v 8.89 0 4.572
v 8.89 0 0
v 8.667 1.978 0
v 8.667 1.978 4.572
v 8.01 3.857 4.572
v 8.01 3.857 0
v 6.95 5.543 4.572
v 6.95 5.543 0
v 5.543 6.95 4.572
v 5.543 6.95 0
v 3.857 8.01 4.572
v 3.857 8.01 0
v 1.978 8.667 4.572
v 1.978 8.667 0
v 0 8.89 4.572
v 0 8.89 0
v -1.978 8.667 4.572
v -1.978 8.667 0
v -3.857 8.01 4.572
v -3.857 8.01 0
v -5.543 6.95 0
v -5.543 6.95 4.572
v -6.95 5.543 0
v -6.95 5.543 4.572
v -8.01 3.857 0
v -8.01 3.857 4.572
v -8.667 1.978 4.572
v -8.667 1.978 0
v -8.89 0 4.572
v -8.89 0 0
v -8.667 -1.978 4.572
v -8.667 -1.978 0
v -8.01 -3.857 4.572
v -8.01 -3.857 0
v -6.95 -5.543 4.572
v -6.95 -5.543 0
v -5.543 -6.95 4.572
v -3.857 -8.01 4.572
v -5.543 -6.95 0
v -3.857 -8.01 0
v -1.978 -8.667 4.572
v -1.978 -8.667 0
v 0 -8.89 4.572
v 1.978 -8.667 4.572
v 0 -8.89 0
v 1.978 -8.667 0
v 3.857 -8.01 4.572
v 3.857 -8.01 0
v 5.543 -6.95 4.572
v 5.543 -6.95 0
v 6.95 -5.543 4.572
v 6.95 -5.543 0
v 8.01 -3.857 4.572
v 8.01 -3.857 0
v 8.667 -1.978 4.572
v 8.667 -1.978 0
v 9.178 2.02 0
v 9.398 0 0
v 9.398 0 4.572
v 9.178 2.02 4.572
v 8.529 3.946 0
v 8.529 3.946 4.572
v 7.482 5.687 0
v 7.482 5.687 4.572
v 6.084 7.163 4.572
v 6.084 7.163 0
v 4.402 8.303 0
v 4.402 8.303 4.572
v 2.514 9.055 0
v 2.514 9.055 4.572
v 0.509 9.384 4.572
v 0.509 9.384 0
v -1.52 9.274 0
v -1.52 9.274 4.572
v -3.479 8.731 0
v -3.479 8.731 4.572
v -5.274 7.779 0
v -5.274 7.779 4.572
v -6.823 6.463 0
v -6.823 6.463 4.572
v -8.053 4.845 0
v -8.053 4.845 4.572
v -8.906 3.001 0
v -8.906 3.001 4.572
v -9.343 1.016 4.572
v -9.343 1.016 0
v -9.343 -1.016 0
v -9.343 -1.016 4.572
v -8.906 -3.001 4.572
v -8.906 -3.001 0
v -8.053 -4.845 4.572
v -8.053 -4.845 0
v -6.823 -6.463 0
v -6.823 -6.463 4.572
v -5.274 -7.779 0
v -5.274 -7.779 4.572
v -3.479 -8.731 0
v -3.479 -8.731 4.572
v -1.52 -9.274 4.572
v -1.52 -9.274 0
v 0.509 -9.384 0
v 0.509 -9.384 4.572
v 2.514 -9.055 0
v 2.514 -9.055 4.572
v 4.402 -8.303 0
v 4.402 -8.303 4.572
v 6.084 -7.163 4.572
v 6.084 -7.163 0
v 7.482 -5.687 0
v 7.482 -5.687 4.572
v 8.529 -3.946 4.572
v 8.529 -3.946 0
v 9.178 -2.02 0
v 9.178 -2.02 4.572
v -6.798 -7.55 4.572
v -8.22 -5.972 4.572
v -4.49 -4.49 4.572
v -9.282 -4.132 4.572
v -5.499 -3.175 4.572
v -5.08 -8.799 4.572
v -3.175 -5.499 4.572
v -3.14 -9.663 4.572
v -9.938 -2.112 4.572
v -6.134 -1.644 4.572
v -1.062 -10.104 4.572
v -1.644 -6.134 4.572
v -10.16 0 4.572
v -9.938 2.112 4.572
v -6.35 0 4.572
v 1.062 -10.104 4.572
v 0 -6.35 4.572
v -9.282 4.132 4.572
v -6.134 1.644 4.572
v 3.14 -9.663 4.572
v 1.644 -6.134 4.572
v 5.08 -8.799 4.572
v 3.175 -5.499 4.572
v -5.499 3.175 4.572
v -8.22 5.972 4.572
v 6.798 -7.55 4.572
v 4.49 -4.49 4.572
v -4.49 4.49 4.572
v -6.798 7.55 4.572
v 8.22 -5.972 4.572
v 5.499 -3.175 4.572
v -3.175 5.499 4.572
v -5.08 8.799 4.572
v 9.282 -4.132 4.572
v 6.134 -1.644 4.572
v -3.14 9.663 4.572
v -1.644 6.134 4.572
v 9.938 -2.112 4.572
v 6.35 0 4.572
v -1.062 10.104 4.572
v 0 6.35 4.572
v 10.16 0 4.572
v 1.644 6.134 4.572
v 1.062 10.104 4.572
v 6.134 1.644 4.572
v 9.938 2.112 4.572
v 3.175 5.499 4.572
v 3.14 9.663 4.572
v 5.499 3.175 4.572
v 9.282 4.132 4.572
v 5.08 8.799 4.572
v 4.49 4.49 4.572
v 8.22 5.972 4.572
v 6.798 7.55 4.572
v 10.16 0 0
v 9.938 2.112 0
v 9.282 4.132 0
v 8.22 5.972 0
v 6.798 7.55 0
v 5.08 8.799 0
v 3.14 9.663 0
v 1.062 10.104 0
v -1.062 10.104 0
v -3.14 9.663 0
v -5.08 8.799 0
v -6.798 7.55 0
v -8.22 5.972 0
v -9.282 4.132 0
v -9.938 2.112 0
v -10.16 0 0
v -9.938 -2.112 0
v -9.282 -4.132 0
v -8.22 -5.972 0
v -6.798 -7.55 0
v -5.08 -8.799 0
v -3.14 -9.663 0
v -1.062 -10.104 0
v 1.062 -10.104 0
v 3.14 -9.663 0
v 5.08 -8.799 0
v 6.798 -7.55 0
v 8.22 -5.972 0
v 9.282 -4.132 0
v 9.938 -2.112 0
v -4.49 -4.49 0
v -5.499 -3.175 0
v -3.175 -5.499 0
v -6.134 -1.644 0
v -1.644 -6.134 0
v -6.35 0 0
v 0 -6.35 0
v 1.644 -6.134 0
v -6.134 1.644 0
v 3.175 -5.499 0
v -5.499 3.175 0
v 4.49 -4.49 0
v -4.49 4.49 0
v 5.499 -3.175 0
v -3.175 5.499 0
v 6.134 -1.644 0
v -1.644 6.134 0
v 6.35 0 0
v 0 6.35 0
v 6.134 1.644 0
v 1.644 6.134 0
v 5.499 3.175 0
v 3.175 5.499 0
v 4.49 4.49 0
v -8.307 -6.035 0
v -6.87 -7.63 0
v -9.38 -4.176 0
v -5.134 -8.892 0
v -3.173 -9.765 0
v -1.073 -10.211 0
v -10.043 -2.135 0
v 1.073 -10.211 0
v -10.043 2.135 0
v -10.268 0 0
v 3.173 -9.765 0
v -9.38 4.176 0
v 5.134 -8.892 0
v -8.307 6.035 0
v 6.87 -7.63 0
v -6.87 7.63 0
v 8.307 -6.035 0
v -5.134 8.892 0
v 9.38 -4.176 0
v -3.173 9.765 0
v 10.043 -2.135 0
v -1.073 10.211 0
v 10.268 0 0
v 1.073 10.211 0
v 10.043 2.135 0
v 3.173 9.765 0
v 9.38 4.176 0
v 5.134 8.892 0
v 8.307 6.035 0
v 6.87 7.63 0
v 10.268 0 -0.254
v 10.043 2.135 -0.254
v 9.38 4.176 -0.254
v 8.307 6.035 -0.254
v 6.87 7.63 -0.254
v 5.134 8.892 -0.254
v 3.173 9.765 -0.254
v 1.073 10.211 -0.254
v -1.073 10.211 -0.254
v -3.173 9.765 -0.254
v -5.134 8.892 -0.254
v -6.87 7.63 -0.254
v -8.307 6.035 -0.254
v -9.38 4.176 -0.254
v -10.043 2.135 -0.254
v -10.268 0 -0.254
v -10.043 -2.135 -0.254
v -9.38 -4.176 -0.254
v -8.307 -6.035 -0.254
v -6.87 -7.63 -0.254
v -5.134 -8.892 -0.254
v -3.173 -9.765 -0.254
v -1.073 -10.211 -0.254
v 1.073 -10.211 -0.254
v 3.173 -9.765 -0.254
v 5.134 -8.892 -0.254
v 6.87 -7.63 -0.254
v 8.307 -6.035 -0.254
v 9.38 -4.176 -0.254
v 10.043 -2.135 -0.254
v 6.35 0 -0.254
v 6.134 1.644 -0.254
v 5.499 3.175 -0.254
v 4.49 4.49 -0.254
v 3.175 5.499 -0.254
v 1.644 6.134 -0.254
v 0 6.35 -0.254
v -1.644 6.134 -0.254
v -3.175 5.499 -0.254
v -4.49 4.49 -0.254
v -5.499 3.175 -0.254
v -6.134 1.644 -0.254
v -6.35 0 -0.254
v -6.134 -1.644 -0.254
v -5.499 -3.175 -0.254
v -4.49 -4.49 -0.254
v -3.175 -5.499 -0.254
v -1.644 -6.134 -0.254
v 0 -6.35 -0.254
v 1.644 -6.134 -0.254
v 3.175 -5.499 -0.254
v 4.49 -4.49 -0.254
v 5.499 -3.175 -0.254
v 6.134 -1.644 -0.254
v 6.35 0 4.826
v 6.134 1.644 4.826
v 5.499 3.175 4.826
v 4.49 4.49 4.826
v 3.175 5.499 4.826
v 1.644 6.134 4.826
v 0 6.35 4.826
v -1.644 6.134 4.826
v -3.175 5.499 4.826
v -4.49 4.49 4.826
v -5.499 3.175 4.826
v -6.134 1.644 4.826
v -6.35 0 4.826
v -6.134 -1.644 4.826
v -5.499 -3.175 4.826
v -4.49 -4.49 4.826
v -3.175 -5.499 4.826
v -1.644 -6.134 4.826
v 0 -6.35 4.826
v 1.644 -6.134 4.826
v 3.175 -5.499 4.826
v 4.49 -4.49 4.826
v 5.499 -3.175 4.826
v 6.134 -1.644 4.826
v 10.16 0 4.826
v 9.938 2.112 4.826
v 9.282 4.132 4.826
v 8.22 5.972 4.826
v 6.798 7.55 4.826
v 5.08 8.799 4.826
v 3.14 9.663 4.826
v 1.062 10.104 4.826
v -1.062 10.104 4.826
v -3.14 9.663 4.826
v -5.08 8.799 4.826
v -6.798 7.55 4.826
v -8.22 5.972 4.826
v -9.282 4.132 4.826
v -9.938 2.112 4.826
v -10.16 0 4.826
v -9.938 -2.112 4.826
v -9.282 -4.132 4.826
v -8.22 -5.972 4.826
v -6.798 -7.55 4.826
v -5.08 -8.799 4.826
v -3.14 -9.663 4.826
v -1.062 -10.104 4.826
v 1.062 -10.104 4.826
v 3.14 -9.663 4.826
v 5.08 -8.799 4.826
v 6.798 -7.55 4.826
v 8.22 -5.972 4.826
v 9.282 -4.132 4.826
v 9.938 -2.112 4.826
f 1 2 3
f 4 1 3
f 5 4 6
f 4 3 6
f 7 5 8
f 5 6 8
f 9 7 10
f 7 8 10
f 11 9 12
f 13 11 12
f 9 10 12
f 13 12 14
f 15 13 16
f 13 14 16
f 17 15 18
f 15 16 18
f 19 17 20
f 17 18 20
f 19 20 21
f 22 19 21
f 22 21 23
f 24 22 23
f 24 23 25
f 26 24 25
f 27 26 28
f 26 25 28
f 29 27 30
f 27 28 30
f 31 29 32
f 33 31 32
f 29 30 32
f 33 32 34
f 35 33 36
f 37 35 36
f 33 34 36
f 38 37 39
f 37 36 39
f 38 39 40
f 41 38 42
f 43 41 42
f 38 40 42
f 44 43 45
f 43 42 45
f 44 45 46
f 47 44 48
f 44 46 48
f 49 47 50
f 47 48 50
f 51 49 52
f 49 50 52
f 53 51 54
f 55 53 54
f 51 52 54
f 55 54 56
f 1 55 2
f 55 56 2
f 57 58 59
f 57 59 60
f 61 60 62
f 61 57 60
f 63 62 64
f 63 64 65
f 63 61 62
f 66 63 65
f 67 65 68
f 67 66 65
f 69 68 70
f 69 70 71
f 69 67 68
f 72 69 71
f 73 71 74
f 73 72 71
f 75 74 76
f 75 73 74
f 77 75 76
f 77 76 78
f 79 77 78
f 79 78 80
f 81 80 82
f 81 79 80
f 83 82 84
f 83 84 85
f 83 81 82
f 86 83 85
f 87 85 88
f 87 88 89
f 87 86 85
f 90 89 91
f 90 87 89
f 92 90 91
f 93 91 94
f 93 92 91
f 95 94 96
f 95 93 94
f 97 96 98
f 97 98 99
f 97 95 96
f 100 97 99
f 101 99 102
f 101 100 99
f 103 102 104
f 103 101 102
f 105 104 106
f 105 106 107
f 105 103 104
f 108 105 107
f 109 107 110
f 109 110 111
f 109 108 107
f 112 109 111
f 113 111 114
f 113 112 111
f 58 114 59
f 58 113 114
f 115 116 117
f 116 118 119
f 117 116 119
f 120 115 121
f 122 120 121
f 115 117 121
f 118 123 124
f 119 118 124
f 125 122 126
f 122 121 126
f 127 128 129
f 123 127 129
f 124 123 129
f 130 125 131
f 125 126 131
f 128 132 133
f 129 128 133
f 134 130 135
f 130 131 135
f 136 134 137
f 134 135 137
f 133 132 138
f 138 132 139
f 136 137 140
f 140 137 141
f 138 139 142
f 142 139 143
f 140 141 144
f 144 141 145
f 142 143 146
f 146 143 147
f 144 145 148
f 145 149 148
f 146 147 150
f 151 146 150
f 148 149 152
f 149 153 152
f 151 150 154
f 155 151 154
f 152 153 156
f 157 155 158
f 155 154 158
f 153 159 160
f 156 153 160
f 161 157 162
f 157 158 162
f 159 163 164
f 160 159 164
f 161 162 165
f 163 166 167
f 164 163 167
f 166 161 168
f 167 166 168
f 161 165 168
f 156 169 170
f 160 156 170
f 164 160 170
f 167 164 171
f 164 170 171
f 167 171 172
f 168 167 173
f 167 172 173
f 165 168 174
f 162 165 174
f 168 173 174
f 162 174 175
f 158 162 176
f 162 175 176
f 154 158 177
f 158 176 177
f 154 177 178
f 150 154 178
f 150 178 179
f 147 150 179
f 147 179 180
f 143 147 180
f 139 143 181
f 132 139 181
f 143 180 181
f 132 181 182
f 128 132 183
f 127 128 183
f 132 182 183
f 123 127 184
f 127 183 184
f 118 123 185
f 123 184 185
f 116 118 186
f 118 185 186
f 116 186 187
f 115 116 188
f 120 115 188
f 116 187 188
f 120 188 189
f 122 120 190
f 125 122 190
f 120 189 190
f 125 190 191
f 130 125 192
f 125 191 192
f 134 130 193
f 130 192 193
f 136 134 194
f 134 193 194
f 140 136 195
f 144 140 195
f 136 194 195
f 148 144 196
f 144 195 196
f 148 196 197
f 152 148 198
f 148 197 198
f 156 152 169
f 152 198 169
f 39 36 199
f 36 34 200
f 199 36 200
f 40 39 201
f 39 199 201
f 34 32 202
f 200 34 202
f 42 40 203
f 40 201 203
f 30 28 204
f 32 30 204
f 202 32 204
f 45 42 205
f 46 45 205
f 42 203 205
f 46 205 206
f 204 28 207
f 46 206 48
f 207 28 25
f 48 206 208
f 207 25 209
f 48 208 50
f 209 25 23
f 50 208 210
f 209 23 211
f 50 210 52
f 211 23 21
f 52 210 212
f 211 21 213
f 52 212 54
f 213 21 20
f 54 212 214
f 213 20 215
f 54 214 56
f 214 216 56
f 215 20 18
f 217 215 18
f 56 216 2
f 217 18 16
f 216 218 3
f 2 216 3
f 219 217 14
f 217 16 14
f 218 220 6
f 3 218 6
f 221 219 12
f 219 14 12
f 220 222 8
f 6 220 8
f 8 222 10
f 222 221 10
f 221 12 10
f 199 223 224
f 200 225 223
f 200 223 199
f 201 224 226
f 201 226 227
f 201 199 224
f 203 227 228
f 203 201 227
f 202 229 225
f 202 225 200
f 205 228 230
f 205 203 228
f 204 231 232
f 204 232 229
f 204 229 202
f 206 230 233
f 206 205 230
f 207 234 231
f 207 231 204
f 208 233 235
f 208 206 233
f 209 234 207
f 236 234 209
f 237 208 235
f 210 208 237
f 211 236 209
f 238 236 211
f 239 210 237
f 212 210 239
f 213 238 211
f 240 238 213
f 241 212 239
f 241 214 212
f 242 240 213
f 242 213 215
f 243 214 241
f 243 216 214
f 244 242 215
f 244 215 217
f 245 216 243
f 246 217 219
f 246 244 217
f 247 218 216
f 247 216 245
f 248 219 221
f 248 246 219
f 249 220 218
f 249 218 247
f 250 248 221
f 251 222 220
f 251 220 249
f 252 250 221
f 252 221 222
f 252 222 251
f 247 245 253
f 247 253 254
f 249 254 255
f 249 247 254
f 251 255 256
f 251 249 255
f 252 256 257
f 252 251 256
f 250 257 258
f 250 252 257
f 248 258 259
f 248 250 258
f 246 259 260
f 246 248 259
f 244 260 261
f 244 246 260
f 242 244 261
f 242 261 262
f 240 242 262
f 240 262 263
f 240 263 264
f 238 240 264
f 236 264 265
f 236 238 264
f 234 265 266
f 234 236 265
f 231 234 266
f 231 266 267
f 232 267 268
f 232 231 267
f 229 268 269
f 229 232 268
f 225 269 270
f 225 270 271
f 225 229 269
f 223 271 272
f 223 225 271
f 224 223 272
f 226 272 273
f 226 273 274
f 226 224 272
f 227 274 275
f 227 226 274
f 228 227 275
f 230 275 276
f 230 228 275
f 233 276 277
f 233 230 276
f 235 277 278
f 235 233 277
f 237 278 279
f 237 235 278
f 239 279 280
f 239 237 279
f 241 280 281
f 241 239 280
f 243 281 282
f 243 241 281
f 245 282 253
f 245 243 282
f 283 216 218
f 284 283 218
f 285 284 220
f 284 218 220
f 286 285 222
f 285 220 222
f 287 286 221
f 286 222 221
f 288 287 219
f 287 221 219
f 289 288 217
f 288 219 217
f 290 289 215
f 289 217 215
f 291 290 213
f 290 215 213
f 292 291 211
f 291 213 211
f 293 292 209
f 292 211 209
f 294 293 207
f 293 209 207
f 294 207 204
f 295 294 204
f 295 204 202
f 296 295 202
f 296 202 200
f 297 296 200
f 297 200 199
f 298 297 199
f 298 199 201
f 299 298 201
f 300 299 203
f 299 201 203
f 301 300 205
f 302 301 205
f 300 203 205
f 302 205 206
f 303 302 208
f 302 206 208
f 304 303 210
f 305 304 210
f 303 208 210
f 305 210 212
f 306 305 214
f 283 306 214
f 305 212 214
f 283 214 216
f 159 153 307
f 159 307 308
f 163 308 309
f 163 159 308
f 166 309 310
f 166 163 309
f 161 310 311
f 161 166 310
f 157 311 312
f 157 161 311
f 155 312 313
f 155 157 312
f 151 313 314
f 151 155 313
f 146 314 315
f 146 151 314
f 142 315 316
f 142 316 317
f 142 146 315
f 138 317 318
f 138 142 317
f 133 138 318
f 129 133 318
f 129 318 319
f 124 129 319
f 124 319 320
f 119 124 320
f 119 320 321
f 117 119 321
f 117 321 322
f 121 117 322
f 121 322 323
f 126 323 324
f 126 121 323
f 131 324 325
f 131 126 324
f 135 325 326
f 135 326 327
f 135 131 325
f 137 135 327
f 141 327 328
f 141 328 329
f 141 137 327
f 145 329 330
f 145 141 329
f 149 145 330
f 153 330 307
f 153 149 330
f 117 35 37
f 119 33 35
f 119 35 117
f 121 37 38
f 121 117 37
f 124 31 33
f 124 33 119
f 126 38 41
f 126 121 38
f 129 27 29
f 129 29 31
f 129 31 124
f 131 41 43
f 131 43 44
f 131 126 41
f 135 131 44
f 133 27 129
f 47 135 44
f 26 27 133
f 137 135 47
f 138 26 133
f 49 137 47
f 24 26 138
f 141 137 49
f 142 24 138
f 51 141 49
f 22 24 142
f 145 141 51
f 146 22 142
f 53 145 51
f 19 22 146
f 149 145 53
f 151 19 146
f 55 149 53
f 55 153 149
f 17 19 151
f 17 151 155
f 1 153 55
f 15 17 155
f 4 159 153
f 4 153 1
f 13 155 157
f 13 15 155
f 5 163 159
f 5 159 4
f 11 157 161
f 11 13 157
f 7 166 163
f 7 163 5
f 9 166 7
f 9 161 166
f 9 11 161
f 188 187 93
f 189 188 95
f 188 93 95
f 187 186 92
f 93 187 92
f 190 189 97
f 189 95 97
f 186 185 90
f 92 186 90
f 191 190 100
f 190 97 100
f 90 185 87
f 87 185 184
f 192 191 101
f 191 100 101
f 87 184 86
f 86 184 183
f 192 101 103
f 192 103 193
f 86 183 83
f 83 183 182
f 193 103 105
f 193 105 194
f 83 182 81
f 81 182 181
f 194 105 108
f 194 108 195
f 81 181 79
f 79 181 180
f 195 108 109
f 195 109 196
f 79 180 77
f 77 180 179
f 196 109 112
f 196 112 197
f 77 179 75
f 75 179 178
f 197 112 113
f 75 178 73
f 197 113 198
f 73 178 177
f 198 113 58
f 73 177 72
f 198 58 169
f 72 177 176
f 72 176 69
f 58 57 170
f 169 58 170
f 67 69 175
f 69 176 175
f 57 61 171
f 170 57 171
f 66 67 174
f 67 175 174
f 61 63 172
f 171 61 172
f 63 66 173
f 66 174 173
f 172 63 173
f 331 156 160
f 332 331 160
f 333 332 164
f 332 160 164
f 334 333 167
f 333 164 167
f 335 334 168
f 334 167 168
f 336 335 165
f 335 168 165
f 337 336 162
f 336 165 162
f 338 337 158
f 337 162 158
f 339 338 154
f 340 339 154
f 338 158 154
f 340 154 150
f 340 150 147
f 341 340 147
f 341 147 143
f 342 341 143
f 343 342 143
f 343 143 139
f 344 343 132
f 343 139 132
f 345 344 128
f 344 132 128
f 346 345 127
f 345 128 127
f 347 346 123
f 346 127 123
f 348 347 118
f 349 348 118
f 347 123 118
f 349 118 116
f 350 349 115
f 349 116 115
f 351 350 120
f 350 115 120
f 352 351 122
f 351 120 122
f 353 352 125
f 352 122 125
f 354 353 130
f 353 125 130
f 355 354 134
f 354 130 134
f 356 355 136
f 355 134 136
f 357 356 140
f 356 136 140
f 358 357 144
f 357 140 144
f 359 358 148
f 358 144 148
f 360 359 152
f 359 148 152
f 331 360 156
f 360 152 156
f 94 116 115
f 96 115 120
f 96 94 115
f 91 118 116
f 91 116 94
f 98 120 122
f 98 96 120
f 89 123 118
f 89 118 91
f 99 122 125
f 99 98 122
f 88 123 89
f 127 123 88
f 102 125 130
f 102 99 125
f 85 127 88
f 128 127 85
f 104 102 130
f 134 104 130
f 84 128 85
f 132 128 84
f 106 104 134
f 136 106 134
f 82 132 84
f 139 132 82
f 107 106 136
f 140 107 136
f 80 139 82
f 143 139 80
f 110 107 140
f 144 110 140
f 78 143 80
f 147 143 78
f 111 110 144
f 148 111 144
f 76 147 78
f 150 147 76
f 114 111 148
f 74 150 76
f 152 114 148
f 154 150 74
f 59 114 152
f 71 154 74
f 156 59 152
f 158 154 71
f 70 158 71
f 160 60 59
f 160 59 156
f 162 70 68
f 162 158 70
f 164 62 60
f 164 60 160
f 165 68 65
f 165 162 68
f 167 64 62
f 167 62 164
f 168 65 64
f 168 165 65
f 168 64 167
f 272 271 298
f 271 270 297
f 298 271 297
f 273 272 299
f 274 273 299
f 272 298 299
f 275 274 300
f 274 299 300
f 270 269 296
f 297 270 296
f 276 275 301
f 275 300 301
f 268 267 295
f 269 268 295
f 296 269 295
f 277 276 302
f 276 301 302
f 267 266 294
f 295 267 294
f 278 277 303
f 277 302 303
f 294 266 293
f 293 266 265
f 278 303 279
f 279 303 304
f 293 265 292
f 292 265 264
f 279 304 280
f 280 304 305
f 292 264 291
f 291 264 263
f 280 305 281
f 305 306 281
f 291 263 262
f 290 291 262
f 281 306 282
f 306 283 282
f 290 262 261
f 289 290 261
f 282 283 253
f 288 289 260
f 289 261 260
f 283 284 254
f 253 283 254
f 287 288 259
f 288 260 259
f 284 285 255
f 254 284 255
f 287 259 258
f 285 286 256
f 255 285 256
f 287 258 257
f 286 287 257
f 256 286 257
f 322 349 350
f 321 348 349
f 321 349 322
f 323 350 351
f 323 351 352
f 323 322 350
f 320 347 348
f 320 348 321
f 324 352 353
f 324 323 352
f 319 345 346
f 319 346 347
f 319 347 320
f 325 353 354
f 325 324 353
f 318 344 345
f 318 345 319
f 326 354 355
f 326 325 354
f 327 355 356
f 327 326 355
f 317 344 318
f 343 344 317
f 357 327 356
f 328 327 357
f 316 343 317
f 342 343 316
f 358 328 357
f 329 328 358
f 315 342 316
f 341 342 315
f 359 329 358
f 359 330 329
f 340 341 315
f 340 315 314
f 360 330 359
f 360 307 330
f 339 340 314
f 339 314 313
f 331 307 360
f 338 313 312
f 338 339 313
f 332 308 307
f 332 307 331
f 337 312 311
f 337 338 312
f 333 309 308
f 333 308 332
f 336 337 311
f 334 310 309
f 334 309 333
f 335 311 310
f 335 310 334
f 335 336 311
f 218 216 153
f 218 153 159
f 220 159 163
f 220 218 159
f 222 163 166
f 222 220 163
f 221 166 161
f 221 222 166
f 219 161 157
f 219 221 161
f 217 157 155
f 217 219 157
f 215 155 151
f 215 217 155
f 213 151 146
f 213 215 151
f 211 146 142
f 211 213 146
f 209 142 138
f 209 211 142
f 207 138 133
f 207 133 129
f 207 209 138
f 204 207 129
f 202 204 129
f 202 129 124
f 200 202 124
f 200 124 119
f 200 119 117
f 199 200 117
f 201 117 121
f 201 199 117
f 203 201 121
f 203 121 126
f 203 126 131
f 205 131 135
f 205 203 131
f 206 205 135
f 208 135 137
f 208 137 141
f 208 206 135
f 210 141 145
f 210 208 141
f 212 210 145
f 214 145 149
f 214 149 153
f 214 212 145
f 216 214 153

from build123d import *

# Parameters (mm, degrees)
F0_R     = 8.89
F0_R_2   = 6.35
F1_DEPTH = 4.572
F2_R     = 10.16
F2_R_2   = 9.398
F3_DEPTH = 4.572
F4_R     = 10.267661
F4_R_2   = 6.35
F5_DEPTH = 0.254
F6_R     = 10.16
F6_R_2   = 6.35
F7_DEPTH = 0.254


with BuildPart() as f1:
    # F0 (on Top) → F1 (new body)
    with BuildSketch(Plane.XY):
        Circle(F0_R)
        Circle(F0_R_2, mode=Mode.SUBTRACT)
    extrude(amount=F1_DEPTH)


with BuildPart() as f3:
    # F2 (on Top) → F3 (new body)
    with BuildSketch(Plane.XY):
        Circle(F2_R)
        Circle(F2_R_2, mode=Mode.SUBTRACT)
    extrude(amount=F3_DEPTH)


with BuildPart() as f5:
    # F4 (on Top) → F5 (new body)
    with BuildSketch(Plane.XY):
        Circle(F4_R)
        Circle(F4_R_2, mode=Mode.SUBTRACT)
    extrude(amount=-F5_DEPTH)


with BuildPart() as f7:
    # F6 (on face) → F7 (new body)
    with BuildSketch(Plane.XY.offset(4.572)):
        Circle(F6_R)
        Circle(F6_R_2, mode=Mode.SUBTRACT)
    extrude(amount=F7_DEPTH)


solid = Compound([f1.part, f3.part, f5.part, f7.part])
